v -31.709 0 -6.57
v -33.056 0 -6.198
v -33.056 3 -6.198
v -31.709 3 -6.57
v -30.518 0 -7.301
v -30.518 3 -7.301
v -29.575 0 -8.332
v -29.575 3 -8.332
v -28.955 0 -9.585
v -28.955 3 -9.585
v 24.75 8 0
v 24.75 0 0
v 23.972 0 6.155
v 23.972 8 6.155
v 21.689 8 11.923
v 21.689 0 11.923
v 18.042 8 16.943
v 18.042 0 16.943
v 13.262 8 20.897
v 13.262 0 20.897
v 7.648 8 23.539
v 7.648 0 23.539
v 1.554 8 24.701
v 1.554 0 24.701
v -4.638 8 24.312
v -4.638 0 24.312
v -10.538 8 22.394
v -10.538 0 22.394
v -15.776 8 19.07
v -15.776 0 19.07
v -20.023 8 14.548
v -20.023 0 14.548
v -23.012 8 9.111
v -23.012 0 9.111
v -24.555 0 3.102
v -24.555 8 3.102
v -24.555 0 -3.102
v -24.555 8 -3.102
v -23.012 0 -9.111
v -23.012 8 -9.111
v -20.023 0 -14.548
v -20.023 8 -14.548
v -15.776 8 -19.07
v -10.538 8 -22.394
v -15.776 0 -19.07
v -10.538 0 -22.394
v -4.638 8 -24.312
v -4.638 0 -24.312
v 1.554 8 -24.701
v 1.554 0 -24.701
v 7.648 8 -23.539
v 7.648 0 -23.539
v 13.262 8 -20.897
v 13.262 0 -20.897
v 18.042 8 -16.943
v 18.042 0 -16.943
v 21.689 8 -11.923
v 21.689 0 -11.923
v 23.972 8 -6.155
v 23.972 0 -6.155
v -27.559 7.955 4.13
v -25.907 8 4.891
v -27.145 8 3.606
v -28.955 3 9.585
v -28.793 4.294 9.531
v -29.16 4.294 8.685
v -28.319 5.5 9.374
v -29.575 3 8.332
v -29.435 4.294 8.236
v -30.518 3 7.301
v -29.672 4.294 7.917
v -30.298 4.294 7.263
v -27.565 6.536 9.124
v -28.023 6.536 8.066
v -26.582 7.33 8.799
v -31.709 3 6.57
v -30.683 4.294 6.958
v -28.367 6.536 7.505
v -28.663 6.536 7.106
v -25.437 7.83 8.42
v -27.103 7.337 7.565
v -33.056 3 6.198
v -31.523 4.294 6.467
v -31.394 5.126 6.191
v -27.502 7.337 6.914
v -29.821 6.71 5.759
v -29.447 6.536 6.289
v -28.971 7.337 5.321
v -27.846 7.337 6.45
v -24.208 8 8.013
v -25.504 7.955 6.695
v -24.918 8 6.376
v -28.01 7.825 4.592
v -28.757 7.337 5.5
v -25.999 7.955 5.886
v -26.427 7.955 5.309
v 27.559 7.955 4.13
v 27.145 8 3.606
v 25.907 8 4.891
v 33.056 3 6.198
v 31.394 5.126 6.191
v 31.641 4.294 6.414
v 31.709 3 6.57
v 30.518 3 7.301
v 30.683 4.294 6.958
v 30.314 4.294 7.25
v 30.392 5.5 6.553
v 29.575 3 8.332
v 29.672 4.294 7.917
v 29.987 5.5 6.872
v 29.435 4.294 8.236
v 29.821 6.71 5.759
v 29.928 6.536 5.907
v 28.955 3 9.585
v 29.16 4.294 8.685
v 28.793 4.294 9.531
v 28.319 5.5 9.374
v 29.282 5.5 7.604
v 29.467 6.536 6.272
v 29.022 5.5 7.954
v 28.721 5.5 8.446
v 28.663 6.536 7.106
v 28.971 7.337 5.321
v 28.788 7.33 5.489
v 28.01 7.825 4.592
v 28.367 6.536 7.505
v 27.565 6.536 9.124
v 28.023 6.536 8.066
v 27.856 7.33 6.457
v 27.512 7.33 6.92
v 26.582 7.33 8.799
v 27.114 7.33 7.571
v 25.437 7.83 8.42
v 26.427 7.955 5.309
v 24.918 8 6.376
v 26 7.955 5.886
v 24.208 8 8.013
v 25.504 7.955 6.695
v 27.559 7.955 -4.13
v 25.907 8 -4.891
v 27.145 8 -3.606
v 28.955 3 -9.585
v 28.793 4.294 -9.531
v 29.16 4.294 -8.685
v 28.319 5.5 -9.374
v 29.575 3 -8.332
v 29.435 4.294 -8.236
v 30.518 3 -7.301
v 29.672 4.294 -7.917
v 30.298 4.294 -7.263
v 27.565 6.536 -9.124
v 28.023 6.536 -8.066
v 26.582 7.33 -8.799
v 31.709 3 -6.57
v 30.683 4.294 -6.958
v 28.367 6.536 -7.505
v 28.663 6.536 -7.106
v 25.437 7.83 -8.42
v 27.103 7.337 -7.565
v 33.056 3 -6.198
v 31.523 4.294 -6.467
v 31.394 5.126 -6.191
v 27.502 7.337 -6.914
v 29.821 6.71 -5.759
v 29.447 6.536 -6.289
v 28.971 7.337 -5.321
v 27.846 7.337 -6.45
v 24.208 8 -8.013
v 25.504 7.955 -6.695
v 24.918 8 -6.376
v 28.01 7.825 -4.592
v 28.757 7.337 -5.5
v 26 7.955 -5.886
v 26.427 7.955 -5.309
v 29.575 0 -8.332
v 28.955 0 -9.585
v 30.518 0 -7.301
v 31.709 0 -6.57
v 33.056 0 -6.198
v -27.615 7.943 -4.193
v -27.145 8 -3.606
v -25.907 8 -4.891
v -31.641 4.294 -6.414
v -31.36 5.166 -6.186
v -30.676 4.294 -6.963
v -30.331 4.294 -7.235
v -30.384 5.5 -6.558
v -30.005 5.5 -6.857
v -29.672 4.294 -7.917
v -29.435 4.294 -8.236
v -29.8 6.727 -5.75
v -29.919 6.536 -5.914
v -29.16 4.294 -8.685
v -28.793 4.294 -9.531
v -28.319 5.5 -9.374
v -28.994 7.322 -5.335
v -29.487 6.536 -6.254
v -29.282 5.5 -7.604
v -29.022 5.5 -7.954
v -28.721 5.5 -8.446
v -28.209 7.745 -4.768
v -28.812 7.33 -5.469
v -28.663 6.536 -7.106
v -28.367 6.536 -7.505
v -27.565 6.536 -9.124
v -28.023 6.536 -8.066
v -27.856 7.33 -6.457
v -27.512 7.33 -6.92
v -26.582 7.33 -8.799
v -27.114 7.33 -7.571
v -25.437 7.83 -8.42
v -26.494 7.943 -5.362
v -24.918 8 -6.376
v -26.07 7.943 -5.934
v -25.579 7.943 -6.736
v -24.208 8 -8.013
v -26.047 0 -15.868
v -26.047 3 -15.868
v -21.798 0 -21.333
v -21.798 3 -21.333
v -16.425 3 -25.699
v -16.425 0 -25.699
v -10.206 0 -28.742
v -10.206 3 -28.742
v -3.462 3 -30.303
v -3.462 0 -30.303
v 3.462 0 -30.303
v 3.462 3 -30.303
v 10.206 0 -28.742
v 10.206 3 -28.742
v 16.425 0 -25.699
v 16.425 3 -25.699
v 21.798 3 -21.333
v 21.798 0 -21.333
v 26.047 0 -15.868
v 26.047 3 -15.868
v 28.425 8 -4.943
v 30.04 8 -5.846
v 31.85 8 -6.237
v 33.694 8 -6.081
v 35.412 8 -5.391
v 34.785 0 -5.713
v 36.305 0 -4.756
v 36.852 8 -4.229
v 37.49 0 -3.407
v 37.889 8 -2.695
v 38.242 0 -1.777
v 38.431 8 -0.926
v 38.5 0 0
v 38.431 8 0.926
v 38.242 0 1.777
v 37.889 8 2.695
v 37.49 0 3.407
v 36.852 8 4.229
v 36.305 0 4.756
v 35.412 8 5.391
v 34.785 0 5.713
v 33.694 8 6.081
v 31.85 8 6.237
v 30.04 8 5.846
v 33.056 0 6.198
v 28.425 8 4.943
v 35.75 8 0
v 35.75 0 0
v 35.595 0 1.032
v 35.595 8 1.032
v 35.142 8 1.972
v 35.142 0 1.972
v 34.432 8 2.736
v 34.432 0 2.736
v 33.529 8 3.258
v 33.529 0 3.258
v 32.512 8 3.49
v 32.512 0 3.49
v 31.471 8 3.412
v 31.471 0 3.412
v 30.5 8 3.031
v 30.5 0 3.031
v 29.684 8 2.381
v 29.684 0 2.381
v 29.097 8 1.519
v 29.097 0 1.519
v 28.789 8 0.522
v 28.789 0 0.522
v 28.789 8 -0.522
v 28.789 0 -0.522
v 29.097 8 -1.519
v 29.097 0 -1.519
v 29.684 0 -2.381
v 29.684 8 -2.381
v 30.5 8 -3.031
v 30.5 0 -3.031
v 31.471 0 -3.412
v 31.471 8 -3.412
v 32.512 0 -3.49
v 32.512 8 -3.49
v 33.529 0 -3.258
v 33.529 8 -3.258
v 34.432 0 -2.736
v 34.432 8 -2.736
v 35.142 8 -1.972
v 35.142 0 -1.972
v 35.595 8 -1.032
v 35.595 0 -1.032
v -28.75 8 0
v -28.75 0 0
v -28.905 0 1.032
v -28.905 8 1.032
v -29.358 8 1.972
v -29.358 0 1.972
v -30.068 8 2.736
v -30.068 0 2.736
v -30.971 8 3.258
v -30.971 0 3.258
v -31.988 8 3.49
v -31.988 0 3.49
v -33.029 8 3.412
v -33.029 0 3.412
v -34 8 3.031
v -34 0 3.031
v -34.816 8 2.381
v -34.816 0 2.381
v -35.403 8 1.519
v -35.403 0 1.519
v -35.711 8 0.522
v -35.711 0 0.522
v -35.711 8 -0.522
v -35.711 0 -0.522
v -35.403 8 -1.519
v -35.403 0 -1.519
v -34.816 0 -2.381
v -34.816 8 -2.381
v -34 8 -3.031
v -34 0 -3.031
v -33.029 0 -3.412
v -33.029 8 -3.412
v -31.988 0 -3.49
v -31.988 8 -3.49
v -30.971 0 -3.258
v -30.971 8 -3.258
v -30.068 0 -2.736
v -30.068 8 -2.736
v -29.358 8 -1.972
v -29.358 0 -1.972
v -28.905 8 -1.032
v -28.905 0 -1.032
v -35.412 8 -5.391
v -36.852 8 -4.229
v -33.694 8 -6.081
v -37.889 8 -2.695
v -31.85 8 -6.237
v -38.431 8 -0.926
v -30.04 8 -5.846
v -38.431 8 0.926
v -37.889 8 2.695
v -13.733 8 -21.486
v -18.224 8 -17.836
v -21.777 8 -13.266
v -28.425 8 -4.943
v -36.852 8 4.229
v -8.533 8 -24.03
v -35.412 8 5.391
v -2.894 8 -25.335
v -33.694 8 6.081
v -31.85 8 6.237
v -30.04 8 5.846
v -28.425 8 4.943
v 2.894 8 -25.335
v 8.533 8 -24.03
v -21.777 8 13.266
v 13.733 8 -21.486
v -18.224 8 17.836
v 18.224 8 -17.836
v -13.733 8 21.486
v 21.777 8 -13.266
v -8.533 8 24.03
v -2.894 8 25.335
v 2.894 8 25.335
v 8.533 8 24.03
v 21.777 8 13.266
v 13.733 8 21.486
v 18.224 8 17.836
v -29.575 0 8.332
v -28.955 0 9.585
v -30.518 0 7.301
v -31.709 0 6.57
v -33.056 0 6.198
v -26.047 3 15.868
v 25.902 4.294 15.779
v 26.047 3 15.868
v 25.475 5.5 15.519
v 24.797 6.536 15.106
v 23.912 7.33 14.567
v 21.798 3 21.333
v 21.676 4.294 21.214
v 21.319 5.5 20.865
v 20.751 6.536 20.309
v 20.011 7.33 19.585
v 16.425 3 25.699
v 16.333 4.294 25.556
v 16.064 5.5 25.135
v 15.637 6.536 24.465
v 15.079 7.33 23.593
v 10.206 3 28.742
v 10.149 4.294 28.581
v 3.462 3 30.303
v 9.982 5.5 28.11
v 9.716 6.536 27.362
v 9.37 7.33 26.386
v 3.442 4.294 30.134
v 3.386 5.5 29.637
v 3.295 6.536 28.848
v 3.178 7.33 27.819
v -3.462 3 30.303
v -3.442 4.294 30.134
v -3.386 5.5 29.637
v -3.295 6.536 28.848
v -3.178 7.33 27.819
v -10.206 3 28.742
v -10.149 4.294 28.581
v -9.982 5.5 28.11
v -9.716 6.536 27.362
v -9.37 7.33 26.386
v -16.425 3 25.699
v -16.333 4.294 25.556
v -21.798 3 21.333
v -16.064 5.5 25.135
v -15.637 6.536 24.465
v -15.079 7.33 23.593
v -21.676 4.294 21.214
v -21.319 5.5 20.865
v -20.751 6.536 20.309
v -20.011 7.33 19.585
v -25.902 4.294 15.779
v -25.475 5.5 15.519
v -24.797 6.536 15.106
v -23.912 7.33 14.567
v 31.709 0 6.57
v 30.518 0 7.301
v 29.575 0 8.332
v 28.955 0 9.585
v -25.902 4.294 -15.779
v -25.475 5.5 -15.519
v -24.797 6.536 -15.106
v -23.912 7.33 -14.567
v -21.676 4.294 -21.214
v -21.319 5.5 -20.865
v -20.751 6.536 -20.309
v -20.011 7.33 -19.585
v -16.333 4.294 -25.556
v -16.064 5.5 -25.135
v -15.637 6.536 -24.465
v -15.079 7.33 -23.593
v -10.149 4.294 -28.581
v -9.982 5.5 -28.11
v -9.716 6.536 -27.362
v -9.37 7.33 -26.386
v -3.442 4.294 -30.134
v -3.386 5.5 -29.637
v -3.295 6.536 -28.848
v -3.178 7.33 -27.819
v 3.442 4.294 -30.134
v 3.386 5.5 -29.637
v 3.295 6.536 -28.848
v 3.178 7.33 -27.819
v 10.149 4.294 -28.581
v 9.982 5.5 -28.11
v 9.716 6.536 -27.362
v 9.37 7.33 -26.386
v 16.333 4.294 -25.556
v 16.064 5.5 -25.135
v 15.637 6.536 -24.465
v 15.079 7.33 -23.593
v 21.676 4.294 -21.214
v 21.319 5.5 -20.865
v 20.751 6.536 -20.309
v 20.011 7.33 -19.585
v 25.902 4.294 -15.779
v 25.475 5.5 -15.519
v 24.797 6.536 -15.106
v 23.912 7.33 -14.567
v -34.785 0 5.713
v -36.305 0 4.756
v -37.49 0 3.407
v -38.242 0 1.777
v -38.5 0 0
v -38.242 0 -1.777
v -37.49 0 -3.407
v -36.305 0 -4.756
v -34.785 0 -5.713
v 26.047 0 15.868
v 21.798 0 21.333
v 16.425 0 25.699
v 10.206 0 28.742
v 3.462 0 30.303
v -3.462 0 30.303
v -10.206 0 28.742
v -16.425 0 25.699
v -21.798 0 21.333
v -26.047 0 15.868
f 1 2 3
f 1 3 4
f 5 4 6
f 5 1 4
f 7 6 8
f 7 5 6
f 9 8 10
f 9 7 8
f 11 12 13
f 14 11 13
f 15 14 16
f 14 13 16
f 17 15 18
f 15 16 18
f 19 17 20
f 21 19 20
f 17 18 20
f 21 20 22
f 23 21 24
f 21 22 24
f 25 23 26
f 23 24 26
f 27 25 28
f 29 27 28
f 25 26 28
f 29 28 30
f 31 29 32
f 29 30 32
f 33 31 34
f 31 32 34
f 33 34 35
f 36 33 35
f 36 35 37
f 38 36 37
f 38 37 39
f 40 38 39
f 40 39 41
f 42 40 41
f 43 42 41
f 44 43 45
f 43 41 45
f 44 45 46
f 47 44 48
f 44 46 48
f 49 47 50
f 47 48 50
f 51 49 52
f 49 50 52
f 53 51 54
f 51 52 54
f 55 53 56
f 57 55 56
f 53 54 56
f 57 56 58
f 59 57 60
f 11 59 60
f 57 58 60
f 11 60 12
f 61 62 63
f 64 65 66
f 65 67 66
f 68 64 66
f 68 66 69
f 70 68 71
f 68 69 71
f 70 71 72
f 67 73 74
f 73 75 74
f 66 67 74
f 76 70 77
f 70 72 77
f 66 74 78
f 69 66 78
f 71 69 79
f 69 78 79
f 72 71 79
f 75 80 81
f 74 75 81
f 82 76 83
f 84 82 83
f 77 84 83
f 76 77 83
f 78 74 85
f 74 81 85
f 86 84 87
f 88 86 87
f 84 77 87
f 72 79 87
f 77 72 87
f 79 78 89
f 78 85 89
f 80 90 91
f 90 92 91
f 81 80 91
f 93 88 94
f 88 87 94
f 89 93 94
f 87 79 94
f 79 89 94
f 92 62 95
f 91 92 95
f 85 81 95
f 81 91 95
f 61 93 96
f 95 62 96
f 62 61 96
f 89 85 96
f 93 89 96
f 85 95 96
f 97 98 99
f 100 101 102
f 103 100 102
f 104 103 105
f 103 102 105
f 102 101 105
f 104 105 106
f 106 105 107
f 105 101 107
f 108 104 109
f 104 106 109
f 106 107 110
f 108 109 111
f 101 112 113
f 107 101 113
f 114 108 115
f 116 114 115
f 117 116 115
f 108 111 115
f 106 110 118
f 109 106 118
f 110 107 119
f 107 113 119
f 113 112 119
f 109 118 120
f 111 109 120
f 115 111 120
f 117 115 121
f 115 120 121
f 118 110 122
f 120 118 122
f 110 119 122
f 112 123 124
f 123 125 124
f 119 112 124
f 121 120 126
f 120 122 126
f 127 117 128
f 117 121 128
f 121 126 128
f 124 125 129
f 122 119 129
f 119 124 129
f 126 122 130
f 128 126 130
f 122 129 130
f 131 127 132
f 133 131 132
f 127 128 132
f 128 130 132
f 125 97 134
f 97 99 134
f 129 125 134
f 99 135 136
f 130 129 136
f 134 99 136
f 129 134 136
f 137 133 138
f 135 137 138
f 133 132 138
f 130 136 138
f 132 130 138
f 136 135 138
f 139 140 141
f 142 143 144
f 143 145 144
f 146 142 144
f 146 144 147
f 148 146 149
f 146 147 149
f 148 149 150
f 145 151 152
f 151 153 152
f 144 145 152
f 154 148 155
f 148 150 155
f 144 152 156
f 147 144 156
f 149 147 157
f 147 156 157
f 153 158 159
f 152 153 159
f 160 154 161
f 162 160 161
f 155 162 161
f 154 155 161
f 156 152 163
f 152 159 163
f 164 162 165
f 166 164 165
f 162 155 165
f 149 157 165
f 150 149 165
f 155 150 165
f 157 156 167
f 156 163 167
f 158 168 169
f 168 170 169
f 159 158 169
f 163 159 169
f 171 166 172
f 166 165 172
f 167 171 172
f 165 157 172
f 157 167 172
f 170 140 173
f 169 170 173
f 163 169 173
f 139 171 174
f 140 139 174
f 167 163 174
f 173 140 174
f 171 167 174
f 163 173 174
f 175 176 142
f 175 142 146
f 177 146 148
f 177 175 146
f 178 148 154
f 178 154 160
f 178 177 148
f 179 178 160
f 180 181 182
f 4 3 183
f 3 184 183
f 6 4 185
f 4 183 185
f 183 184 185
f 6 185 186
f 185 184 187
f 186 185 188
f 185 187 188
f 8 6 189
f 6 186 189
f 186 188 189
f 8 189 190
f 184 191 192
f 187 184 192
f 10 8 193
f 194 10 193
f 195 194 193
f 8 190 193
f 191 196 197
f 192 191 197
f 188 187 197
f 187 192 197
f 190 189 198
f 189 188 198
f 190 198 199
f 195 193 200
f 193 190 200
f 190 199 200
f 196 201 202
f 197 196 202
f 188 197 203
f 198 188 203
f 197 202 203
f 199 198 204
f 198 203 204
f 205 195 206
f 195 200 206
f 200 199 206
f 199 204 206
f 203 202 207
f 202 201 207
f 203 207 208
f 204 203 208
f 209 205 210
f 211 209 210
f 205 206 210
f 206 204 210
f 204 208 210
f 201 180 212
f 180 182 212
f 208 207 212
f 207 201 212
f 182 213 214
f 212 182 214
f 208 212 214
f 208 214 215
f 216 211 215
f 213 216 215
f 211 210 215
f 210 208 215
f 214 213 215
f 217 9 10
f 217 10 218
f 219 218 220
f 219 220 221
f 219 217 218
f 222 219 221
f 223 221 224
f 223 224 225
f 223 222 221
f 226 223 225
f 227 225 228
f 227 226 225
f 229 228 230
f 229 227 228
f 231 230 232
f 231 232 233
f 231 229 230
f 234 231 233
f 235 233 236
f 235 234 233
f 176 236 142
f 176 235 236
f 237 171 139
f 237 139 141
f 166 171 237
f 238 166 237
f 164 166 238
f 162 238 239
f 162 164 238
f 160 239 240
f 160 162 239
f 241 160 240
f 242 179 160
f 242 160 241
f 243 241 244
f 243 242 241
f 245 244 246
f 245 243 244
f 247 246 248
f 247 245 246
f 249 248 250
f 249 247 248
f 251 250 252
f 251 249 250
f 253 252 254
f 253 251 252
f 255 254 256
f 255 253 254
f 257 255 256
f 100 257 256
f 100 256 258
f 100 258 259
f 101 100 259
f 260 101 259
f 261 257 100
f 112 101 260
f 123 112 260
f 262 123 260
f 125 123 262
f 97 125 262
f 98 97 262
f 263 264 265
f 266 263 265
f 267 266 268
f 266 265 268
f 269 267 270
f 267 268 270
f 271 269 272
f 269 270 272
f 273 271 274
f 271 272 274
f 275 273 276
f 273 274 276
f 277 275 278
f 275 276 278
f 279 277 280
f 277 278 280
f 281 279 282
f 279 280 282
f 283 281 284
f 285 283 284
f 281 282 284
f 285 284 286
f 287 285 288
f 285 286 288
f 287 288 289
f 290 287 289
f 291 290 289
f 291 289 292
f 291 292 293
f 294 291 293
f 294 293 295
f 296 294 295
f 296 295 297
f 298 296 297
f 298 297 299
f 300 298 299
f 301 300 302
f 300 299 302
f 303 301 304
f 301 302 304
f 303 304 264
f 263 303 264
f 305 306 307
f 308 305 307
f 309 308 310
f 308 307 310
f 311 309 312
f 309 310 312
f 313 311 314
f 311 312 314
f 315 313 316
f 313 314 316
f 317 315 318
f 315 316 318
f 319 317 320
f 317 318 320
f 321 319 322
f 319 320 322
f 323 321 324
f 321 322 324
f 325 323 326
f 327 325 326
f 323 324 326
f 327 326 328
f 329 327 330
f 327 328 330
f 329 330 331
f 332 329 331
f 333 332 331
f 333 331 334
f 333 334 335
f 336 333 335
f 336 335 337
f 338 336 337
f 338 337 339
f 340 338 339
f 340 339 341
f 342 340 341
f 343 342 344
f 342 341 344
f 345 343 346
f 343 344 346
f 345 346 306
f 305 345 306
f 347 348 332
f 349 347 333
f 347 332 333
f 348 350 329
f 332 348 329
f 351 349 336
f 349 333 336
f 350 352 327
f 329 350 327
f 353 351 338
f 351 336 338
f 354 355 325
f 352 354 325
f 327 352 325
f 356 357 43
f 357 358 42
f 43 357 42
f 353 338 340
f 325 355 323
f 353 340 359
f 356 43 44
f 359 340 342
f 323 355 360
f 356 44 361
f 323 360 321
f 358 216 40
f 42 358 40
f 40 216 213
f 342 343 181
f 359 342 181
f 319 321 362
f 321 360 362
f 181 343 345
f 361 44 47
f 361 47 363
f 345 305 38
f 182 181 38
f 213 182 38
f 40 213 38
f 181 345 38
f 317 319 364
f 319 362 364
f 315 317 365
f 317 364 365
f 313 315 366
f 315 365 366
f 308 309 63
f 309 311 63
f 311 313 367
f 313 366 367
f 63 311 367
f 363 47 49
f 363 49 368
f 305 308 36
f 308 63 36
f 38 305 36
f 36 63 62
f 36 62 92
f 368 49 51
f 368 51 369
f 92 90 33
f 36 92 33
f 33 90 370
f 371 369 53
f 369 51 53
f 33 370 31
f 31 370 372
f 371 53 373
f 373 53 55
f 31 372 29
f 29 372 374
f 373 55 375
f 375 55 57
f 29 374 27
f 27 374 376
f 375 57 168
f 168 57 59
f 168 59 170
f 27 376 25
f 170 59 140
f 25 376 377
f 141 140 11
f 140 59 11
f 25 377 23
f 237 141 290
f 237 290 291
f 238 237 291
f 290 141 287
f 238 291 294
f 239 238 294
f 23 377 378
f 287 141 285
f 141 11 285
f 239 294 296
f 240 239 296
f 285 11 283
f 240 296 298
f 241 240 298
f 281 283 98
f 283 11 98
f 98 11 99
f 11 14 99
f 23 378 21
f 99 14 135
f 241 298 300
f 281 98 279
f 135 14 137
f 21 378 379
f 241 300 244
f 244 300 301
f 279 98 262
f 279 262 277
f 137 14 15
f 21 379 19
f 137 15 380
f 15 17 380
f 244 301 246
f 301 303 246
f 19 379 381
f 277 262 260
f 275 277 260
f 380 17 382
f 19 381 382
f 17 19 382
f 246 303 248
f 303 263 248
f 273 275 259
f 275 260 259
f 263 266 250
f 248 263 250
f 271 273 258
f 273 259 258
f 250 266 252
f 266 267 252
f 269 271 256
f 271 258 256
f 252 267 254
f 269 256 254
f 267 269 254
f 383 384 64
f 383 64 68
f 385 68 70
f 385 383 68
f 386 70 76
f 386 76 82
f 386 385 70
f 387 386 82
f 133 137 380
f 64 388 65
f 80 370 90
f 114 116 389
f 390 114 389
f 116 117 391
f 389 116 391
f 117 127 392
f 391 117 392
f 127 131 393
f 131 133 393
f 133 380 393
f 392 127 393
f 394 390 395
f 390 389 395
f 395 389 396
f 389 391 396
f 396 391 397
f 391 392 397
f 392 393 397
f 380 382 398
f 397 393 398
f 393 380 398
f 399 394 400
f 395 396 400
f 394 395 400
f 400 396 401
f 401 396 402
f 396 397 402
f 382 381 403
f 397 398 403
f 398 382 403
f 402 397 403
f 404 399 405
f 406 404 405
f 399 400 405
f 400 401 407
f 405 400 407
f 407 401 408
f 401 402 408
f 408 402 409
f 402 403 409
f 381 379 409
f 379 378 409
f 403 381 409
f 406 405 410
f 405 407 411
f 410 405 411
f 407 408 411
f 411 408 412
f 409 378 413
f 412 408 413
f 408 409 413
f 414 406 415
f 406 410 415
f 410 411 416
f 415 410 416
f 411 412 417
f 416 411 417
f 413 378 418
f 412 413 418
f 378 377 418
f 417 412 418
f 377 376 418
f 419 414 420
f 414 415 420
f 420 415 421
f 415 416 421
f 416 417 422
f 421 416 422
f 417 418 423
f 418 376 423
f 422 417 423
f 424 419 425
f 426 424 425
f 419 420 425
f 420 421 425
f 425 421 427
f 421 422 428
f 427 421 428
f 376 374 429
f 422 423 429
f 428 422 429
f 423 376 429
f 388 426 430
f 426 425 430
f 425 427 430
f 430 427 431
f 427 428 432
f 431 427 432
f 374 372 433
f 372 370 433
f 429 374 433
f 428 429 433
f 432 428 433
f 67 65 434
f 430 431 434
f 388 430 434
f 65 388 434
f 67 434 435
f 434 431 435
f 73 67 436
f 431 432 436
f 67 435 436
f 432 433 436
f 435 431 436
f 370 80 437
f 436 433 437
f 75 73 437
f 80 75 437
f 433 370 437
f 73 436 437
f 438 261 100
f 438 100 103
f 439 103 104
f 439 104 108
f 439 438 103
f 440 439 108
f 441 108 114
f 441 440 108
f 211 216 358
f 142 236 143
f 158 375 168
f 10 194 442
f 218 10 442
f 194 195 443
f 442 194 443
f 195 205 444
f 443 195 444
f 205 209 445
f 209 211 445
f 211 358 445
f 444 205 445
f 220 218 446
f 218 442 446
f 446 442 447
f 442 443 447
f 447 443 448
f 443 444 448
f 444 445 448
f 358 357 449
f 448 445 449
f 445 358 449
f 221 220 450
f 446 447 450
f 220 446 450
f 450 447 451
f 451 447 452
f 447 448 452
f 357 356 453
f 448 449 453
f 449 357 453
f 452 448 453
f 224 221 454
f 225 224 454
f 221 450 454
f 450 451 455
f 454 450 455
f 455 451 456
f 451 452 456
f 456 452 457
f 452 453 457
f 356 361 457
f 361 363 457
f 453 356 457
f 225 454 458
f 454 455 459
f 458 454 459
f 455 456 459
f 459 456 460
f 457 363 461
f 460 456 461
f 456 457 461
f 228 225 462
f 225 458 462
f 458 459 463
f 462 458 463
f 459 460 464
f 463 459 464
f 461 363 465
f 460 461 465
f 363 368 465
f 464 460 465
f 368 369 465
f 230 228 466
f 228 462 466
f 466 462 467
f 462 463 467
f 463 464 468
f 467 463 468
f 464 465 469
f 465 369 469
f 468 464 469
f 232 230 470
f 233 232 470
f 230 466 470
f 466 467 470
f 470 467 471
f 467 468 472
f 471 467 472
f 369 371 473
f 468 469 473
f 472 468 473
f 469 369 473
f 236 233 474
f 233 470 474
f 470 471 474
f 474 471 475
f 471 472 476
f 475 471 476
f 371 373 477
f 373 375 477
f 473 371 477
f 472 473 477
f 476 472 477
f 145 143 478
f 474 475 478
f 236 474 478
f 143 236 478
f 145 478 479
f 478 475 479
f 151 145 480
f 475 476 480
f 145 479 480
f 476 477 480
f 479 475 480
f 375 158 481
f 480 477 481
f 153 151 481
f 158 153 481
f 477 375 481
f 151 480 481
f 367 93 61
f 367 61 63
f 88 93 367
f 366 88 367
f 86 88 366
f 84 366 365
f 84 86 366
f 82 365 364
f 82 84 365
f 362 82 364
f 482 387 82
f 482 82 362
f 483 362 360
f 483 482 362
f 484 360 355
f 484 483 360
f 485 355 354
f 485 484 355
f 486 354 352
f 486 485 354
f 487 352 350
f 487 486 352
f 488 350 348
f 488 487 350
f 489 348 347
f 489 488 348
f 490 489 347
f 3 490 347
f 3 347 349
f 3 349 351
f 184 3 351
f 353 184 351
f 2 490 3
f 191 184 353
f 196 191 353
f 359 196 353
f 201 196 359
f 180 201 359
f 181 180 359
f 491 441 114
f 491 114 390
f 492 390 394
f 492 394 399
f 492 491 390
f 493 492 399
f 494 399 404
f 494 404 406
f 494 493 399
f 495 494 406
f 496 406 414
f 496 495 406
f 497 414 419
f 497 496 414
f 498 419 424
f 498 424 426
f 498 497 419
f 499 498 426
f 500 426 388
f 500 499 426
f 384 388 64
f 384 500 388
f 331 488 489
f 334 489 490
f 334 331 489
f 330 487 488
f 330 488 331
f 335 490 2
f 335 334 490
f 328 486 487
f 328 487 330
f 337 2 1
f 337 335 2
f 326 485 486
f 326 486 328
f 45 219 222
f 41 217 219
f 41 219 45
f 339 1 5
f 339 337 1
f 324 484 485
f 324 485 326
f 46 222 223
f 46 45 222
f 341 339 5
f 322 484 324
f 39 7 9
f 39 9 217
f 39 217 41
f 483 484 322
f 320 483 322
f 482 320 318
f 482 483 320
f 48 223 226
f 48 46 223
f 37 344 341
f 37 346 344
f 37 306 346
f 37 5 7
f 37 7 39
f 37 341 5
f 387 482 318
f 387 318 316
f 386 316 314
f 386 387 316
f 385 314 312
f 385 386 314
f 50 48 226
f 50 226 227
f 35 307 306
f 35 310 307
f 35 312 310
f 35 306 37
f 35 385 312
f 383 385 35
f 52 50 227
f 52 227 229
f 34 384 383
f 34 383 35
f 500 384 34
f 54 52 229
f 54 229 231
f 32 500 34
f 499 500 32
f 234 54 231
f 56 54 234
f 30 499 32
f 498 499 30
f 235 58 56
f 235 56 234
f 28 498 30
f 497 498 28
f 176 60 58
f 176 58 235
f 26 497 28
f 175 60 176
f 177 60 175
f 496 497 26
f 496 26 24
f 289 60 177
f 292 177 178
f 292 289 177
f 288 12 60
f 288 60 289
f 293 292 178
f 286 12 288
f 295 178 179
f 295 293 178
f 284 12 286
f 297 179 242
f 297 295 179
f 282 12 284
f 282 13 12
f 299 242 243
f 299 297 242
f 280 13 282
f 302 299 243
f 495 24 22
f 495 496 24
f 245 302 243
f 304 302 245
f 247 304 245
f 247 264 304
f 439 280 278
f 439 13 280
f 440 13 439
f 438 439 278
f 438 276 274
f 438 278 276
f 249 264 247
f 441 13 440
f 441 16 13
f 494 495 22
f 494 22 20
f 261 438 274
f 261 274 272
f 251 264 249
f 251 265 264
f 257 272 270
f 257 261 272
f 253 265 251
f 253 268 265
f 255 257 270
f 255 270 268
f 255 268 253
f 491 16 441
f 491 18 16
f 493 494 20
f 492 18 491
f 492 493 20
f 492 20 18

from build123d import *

# Parameters (mm, degrees)
F0_R     = 24.75
F1_DEPTH = 8
F3_R     = 5
F2_R     = 6.25
F2_R_2   = 3.5
F4_DEPTH = 8


with BuildPart() as f1:
    # F0 (on Front) → F1 (new body)
    with BuildSketch(Plane.XZ):
        with BuildLine():
            ThreePointArc((33.056416882, 6.1977569985), (30.5178723488, 7.3005515757), (28.9548531499, 9.5847002596))
            ThreePointArc((28.9548531499, 9.5847002596), (0, 30.5), (-28.9548531499, 9.5847002596))
            ThreePointArc((-28.9548531499, 9.5847002596), (-30.5178723488, 7.3005515757), (-33.056416882, 6.1977569985))
            ThreePointArc((-33.056416882, 6.1977569985), (-28.1255367326, 4.6958814674), (-26, 0))
            ThreePointArc((-26, 0), (-28.1255367326, -4.6958814674), (-33.056416882, -6.1977569985))
            ThreePointArc((-33.056416882, -6.1977569985), (-30.5178723488, -7.3005515757), (-28.9548531499, -9.5847002596))
            ThreePointArc((-28.9548531499, -9.5847002596), (0, -30.5), (28.9548531499, -9.5847002596))
            ThreePointArc((28.9548531499, -9.5847002596), (30.5178723488, -7.3005515757), (33.056416882, -6.1977569985))
            ThreePointArc((33.056416882, -6.1977569985), (26, 0), (33.056416882, 6.1977569985))
        make_face()
        Circle(F0_R, mode=Mode.SUBTRACT)
    extrude(amount=-F1_DEPTH)

    # F3
    f3_edges = [f1.edges().sort_by_distance(p)[0] for p in [
        (30.517872, 8, -7.300552),
        (0, 8, -30.5),
        (0, 8, 30.5),
    ]]
    fillet(f3_edges, radius=F3_R)

    # F2 (on Front) → F4 (join)
    with BuildSketch(Plane.XZ):
        with Locations((32.25, 0)):
            Circle(F2_R)
        with Locations((32.25, 0)):
            Circle(F2_R_2, mode=Mode.SUBTRACT)
        with Locations((-32.25, 0)):
            Circle(F2_R)
        with Locations((-32.25, 0)):
            Circle(F2_R_2, mode=Mode.SUBTRACT)
    extrude(amount=-F4_DEPTH)


solid = f1.part
